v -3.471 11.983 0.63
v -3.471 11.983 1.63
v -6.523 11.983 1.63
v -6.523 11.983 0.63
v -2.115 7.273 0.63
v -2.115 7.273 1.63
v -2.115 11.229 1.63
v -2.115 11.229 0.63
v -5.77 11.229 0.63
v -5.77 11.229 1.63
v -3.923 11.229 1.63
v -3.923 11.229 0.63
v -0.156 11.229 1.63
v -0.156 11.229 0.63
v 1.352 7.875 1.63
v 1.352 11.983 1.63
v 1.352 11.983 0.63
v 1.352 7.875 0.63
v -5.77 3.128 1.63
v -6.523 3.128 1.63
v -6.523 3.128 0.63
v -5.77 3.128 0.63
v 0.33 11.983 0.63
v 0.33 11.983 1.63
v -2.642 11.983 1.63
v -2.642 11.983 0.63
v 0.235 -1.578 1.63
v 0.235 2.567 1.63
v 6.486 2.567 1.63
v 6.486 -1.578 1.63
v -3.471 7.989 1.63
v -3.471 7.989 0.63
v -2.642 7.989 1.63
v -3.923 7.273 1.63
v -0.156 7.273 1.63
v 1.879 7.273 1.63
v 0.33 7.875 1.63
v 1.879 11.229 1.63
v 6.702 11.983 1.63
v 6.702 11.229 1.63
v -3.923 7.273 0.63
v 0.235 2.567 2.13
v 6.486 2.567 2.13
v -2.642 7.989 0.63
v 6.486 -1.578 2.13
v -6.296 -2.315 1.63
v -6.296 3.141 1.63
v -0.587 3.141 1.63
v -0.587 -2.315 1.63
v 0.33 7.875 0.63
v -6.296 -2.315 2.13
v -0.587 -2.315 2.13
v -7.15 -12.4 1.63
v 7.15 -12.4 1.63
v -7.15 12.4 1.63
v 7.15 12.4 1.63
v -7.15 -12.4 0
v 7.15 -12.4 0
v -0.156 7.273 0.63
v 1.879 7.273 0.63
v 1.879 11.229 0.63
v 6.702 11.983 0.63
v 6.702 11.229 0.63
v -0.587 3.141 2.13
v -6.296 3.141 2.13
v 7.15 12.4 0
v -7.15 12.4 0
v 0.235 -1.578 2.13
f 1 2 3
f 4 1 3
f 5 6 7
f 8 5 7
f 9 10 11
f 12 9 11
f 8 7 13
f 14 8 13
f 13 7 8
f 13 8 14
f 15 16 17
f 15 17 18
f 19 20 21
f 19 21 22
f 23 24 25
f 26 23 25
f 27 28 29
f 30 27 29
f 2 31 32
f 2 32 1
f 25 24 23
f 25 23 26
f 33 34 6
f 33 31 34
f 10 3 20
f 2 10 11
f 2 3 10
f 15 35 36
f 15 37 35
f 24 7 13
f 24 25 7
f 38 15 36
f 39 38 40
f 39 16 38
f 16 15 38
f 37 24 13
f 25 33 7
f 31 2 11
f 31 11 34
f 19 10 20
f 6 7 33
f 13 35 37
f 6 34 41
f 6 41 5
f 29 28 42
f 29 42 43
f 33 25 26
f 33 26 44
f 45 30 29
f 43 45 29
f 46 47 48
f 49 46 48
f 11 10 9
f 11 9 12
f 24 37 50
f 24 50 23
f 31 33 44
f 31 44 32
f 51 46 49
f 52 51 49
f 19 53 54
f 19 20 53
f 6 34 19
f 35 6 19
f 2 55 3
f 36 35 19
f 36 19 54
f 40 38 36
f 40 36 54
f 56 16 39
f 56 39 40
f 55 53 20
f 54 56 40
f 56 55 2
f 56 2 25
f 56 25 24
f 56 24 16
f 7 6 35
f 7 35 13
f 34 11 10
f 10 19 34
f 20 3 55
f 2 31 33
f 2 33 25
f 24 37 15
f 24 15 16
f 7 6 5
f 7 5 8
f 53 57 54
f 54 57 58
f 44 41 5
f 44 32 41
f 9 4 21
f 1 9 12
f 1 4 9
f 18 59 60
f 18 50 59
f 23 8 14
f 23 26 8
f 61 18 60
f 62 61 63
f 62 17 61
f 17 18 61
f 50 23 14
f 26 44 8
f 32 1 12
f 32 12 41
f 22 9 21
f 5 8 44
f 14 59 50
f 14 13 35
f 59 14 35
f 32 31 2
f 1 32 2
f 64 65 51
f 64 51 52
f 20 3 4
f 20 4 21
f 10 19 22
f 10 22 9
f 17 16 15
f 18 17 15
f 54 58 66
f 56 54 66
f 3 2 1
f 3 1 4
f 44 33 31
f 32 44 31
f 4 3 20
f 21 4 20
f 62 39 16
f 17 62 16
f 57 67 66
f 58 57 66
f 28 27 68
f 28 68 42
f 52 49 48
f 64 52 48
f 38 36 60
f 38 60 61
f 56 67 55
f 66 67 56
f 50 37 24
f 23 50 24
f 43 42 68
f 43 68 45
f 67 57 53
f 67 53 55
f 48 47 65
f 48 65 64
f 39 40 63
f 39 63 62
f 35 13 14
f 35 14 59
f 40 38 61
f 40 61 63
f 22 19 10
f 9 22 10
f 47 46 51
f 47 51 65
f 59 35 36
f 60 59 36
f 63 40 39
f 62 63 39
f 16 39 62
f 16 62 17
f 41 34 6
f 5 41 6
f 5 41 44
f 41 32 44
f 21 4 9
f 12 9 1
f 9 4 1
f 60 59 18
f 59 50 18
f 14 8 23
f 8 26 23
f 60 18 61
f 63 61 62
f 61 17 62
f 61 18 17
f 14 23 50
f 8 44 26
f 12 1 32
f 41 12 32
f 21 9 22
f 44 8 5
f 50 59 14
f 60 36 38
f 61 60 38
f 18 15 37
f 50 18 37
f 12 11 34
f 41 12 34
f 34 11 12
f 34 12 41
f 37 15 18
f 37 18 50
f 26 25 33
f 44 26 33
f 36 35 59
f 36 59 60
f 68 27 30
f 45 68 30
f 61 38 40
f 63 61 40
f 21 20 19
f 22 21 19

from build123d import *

# Parameters (mm, degrees)
F0_W     = 14.3
F0_H     = 24.8
F1_DEPTH = 1.63
F3_DEPTH = 1
F4_DEPTH = 1
F5_W     = 5.709587
F5_H     = 5.455827
F5_W_2   = 6.250733
F5_H_2   = 4.144751
F6_DEPTH = 0.5


with BuildPart() as f1:
    # F0 (on Top) → F1 (new body)
    with BuildSketch(Plane.XY):
        Rectangle(F0_W, F0_H)
    extrude(amount=F1_DEPTH)

    # F2 (on face) → F3 (cut)
    with BuildSketch(Plane.XY.offset(1.63)):
        Polygon((1.879126, 11.228926), (6.702036, 11.228926), (6.702036, 11.982505), (1.35162, 11.982505), (1.35162, 7.875495), (0.33, 7.875495), (0.33, 11.982505), (-2.642353, 11.982505), (-2.642353, 7.988532), (-3.47129, 7.988532), (-3.47129, 11.982505), (-6.523289, 11.982505), (-6.523289, 3.127943), (-5.769709, 3.127943), (-5.769709, 11.228926), (-3.923438, 11.228926), (-3.923438, 7.272632), (-2.114847, 7.272632), (-2.114847, 11.228926), (-0.155539, 11.228926), (-0.155539, 7.272632), (1.879126, 7.272632), align=None)
    extrude(amount=-F3_DEPTH, mode=Mode.SUBTRACT)


with BuildPart() as f4:
    # F2 (on face) → F4 (new body)
    with BuildSketch(Plane.XY.offset(1.63)):
        Polygon((1.879126, 11.228926), (6.702036, 11.228926), (6.702036, 11.982505), (1.35162, 11.982505), (1.35162, 7.875495), (0.33, 7.875495), (0.33, 11.982505), (-2.642353, 11.982505), (-2.642353, 7.988532), (-3.47129, 7.988532), (-3.47129, 11.982505), (-6.523289, 11.982505), (-6.523289, 3.127943), (-5.769709, 3.127943), (-5.769709, 11.228926), (-3.923438, 11.228926), (-3.923438, 7.272632), (-2.114847, 7.272632), (-2.114847, 11.228926), (-0.155539, 11.228926), (-0.155539, 7.272632), (1.879126, 7.272632), align=None)
    extrude(amount=-F4_DEPTH)


with BuildPart() as f6:
    # F5 (on face) → F6 (new body)
    with BuildSketch(Plane.XY.offset(1.63)):
        with Locations((-3.441456, 0.413186)):
            Rectangle(F5_W, F5_H)
        with Locations((3.360338, 0.494237)):
            Rectangle(F5_W_2, F5_H_2)
    extrude(amount=F6_DEPTH)


solid = Compound([f1.part, f4.part, f6.part])
